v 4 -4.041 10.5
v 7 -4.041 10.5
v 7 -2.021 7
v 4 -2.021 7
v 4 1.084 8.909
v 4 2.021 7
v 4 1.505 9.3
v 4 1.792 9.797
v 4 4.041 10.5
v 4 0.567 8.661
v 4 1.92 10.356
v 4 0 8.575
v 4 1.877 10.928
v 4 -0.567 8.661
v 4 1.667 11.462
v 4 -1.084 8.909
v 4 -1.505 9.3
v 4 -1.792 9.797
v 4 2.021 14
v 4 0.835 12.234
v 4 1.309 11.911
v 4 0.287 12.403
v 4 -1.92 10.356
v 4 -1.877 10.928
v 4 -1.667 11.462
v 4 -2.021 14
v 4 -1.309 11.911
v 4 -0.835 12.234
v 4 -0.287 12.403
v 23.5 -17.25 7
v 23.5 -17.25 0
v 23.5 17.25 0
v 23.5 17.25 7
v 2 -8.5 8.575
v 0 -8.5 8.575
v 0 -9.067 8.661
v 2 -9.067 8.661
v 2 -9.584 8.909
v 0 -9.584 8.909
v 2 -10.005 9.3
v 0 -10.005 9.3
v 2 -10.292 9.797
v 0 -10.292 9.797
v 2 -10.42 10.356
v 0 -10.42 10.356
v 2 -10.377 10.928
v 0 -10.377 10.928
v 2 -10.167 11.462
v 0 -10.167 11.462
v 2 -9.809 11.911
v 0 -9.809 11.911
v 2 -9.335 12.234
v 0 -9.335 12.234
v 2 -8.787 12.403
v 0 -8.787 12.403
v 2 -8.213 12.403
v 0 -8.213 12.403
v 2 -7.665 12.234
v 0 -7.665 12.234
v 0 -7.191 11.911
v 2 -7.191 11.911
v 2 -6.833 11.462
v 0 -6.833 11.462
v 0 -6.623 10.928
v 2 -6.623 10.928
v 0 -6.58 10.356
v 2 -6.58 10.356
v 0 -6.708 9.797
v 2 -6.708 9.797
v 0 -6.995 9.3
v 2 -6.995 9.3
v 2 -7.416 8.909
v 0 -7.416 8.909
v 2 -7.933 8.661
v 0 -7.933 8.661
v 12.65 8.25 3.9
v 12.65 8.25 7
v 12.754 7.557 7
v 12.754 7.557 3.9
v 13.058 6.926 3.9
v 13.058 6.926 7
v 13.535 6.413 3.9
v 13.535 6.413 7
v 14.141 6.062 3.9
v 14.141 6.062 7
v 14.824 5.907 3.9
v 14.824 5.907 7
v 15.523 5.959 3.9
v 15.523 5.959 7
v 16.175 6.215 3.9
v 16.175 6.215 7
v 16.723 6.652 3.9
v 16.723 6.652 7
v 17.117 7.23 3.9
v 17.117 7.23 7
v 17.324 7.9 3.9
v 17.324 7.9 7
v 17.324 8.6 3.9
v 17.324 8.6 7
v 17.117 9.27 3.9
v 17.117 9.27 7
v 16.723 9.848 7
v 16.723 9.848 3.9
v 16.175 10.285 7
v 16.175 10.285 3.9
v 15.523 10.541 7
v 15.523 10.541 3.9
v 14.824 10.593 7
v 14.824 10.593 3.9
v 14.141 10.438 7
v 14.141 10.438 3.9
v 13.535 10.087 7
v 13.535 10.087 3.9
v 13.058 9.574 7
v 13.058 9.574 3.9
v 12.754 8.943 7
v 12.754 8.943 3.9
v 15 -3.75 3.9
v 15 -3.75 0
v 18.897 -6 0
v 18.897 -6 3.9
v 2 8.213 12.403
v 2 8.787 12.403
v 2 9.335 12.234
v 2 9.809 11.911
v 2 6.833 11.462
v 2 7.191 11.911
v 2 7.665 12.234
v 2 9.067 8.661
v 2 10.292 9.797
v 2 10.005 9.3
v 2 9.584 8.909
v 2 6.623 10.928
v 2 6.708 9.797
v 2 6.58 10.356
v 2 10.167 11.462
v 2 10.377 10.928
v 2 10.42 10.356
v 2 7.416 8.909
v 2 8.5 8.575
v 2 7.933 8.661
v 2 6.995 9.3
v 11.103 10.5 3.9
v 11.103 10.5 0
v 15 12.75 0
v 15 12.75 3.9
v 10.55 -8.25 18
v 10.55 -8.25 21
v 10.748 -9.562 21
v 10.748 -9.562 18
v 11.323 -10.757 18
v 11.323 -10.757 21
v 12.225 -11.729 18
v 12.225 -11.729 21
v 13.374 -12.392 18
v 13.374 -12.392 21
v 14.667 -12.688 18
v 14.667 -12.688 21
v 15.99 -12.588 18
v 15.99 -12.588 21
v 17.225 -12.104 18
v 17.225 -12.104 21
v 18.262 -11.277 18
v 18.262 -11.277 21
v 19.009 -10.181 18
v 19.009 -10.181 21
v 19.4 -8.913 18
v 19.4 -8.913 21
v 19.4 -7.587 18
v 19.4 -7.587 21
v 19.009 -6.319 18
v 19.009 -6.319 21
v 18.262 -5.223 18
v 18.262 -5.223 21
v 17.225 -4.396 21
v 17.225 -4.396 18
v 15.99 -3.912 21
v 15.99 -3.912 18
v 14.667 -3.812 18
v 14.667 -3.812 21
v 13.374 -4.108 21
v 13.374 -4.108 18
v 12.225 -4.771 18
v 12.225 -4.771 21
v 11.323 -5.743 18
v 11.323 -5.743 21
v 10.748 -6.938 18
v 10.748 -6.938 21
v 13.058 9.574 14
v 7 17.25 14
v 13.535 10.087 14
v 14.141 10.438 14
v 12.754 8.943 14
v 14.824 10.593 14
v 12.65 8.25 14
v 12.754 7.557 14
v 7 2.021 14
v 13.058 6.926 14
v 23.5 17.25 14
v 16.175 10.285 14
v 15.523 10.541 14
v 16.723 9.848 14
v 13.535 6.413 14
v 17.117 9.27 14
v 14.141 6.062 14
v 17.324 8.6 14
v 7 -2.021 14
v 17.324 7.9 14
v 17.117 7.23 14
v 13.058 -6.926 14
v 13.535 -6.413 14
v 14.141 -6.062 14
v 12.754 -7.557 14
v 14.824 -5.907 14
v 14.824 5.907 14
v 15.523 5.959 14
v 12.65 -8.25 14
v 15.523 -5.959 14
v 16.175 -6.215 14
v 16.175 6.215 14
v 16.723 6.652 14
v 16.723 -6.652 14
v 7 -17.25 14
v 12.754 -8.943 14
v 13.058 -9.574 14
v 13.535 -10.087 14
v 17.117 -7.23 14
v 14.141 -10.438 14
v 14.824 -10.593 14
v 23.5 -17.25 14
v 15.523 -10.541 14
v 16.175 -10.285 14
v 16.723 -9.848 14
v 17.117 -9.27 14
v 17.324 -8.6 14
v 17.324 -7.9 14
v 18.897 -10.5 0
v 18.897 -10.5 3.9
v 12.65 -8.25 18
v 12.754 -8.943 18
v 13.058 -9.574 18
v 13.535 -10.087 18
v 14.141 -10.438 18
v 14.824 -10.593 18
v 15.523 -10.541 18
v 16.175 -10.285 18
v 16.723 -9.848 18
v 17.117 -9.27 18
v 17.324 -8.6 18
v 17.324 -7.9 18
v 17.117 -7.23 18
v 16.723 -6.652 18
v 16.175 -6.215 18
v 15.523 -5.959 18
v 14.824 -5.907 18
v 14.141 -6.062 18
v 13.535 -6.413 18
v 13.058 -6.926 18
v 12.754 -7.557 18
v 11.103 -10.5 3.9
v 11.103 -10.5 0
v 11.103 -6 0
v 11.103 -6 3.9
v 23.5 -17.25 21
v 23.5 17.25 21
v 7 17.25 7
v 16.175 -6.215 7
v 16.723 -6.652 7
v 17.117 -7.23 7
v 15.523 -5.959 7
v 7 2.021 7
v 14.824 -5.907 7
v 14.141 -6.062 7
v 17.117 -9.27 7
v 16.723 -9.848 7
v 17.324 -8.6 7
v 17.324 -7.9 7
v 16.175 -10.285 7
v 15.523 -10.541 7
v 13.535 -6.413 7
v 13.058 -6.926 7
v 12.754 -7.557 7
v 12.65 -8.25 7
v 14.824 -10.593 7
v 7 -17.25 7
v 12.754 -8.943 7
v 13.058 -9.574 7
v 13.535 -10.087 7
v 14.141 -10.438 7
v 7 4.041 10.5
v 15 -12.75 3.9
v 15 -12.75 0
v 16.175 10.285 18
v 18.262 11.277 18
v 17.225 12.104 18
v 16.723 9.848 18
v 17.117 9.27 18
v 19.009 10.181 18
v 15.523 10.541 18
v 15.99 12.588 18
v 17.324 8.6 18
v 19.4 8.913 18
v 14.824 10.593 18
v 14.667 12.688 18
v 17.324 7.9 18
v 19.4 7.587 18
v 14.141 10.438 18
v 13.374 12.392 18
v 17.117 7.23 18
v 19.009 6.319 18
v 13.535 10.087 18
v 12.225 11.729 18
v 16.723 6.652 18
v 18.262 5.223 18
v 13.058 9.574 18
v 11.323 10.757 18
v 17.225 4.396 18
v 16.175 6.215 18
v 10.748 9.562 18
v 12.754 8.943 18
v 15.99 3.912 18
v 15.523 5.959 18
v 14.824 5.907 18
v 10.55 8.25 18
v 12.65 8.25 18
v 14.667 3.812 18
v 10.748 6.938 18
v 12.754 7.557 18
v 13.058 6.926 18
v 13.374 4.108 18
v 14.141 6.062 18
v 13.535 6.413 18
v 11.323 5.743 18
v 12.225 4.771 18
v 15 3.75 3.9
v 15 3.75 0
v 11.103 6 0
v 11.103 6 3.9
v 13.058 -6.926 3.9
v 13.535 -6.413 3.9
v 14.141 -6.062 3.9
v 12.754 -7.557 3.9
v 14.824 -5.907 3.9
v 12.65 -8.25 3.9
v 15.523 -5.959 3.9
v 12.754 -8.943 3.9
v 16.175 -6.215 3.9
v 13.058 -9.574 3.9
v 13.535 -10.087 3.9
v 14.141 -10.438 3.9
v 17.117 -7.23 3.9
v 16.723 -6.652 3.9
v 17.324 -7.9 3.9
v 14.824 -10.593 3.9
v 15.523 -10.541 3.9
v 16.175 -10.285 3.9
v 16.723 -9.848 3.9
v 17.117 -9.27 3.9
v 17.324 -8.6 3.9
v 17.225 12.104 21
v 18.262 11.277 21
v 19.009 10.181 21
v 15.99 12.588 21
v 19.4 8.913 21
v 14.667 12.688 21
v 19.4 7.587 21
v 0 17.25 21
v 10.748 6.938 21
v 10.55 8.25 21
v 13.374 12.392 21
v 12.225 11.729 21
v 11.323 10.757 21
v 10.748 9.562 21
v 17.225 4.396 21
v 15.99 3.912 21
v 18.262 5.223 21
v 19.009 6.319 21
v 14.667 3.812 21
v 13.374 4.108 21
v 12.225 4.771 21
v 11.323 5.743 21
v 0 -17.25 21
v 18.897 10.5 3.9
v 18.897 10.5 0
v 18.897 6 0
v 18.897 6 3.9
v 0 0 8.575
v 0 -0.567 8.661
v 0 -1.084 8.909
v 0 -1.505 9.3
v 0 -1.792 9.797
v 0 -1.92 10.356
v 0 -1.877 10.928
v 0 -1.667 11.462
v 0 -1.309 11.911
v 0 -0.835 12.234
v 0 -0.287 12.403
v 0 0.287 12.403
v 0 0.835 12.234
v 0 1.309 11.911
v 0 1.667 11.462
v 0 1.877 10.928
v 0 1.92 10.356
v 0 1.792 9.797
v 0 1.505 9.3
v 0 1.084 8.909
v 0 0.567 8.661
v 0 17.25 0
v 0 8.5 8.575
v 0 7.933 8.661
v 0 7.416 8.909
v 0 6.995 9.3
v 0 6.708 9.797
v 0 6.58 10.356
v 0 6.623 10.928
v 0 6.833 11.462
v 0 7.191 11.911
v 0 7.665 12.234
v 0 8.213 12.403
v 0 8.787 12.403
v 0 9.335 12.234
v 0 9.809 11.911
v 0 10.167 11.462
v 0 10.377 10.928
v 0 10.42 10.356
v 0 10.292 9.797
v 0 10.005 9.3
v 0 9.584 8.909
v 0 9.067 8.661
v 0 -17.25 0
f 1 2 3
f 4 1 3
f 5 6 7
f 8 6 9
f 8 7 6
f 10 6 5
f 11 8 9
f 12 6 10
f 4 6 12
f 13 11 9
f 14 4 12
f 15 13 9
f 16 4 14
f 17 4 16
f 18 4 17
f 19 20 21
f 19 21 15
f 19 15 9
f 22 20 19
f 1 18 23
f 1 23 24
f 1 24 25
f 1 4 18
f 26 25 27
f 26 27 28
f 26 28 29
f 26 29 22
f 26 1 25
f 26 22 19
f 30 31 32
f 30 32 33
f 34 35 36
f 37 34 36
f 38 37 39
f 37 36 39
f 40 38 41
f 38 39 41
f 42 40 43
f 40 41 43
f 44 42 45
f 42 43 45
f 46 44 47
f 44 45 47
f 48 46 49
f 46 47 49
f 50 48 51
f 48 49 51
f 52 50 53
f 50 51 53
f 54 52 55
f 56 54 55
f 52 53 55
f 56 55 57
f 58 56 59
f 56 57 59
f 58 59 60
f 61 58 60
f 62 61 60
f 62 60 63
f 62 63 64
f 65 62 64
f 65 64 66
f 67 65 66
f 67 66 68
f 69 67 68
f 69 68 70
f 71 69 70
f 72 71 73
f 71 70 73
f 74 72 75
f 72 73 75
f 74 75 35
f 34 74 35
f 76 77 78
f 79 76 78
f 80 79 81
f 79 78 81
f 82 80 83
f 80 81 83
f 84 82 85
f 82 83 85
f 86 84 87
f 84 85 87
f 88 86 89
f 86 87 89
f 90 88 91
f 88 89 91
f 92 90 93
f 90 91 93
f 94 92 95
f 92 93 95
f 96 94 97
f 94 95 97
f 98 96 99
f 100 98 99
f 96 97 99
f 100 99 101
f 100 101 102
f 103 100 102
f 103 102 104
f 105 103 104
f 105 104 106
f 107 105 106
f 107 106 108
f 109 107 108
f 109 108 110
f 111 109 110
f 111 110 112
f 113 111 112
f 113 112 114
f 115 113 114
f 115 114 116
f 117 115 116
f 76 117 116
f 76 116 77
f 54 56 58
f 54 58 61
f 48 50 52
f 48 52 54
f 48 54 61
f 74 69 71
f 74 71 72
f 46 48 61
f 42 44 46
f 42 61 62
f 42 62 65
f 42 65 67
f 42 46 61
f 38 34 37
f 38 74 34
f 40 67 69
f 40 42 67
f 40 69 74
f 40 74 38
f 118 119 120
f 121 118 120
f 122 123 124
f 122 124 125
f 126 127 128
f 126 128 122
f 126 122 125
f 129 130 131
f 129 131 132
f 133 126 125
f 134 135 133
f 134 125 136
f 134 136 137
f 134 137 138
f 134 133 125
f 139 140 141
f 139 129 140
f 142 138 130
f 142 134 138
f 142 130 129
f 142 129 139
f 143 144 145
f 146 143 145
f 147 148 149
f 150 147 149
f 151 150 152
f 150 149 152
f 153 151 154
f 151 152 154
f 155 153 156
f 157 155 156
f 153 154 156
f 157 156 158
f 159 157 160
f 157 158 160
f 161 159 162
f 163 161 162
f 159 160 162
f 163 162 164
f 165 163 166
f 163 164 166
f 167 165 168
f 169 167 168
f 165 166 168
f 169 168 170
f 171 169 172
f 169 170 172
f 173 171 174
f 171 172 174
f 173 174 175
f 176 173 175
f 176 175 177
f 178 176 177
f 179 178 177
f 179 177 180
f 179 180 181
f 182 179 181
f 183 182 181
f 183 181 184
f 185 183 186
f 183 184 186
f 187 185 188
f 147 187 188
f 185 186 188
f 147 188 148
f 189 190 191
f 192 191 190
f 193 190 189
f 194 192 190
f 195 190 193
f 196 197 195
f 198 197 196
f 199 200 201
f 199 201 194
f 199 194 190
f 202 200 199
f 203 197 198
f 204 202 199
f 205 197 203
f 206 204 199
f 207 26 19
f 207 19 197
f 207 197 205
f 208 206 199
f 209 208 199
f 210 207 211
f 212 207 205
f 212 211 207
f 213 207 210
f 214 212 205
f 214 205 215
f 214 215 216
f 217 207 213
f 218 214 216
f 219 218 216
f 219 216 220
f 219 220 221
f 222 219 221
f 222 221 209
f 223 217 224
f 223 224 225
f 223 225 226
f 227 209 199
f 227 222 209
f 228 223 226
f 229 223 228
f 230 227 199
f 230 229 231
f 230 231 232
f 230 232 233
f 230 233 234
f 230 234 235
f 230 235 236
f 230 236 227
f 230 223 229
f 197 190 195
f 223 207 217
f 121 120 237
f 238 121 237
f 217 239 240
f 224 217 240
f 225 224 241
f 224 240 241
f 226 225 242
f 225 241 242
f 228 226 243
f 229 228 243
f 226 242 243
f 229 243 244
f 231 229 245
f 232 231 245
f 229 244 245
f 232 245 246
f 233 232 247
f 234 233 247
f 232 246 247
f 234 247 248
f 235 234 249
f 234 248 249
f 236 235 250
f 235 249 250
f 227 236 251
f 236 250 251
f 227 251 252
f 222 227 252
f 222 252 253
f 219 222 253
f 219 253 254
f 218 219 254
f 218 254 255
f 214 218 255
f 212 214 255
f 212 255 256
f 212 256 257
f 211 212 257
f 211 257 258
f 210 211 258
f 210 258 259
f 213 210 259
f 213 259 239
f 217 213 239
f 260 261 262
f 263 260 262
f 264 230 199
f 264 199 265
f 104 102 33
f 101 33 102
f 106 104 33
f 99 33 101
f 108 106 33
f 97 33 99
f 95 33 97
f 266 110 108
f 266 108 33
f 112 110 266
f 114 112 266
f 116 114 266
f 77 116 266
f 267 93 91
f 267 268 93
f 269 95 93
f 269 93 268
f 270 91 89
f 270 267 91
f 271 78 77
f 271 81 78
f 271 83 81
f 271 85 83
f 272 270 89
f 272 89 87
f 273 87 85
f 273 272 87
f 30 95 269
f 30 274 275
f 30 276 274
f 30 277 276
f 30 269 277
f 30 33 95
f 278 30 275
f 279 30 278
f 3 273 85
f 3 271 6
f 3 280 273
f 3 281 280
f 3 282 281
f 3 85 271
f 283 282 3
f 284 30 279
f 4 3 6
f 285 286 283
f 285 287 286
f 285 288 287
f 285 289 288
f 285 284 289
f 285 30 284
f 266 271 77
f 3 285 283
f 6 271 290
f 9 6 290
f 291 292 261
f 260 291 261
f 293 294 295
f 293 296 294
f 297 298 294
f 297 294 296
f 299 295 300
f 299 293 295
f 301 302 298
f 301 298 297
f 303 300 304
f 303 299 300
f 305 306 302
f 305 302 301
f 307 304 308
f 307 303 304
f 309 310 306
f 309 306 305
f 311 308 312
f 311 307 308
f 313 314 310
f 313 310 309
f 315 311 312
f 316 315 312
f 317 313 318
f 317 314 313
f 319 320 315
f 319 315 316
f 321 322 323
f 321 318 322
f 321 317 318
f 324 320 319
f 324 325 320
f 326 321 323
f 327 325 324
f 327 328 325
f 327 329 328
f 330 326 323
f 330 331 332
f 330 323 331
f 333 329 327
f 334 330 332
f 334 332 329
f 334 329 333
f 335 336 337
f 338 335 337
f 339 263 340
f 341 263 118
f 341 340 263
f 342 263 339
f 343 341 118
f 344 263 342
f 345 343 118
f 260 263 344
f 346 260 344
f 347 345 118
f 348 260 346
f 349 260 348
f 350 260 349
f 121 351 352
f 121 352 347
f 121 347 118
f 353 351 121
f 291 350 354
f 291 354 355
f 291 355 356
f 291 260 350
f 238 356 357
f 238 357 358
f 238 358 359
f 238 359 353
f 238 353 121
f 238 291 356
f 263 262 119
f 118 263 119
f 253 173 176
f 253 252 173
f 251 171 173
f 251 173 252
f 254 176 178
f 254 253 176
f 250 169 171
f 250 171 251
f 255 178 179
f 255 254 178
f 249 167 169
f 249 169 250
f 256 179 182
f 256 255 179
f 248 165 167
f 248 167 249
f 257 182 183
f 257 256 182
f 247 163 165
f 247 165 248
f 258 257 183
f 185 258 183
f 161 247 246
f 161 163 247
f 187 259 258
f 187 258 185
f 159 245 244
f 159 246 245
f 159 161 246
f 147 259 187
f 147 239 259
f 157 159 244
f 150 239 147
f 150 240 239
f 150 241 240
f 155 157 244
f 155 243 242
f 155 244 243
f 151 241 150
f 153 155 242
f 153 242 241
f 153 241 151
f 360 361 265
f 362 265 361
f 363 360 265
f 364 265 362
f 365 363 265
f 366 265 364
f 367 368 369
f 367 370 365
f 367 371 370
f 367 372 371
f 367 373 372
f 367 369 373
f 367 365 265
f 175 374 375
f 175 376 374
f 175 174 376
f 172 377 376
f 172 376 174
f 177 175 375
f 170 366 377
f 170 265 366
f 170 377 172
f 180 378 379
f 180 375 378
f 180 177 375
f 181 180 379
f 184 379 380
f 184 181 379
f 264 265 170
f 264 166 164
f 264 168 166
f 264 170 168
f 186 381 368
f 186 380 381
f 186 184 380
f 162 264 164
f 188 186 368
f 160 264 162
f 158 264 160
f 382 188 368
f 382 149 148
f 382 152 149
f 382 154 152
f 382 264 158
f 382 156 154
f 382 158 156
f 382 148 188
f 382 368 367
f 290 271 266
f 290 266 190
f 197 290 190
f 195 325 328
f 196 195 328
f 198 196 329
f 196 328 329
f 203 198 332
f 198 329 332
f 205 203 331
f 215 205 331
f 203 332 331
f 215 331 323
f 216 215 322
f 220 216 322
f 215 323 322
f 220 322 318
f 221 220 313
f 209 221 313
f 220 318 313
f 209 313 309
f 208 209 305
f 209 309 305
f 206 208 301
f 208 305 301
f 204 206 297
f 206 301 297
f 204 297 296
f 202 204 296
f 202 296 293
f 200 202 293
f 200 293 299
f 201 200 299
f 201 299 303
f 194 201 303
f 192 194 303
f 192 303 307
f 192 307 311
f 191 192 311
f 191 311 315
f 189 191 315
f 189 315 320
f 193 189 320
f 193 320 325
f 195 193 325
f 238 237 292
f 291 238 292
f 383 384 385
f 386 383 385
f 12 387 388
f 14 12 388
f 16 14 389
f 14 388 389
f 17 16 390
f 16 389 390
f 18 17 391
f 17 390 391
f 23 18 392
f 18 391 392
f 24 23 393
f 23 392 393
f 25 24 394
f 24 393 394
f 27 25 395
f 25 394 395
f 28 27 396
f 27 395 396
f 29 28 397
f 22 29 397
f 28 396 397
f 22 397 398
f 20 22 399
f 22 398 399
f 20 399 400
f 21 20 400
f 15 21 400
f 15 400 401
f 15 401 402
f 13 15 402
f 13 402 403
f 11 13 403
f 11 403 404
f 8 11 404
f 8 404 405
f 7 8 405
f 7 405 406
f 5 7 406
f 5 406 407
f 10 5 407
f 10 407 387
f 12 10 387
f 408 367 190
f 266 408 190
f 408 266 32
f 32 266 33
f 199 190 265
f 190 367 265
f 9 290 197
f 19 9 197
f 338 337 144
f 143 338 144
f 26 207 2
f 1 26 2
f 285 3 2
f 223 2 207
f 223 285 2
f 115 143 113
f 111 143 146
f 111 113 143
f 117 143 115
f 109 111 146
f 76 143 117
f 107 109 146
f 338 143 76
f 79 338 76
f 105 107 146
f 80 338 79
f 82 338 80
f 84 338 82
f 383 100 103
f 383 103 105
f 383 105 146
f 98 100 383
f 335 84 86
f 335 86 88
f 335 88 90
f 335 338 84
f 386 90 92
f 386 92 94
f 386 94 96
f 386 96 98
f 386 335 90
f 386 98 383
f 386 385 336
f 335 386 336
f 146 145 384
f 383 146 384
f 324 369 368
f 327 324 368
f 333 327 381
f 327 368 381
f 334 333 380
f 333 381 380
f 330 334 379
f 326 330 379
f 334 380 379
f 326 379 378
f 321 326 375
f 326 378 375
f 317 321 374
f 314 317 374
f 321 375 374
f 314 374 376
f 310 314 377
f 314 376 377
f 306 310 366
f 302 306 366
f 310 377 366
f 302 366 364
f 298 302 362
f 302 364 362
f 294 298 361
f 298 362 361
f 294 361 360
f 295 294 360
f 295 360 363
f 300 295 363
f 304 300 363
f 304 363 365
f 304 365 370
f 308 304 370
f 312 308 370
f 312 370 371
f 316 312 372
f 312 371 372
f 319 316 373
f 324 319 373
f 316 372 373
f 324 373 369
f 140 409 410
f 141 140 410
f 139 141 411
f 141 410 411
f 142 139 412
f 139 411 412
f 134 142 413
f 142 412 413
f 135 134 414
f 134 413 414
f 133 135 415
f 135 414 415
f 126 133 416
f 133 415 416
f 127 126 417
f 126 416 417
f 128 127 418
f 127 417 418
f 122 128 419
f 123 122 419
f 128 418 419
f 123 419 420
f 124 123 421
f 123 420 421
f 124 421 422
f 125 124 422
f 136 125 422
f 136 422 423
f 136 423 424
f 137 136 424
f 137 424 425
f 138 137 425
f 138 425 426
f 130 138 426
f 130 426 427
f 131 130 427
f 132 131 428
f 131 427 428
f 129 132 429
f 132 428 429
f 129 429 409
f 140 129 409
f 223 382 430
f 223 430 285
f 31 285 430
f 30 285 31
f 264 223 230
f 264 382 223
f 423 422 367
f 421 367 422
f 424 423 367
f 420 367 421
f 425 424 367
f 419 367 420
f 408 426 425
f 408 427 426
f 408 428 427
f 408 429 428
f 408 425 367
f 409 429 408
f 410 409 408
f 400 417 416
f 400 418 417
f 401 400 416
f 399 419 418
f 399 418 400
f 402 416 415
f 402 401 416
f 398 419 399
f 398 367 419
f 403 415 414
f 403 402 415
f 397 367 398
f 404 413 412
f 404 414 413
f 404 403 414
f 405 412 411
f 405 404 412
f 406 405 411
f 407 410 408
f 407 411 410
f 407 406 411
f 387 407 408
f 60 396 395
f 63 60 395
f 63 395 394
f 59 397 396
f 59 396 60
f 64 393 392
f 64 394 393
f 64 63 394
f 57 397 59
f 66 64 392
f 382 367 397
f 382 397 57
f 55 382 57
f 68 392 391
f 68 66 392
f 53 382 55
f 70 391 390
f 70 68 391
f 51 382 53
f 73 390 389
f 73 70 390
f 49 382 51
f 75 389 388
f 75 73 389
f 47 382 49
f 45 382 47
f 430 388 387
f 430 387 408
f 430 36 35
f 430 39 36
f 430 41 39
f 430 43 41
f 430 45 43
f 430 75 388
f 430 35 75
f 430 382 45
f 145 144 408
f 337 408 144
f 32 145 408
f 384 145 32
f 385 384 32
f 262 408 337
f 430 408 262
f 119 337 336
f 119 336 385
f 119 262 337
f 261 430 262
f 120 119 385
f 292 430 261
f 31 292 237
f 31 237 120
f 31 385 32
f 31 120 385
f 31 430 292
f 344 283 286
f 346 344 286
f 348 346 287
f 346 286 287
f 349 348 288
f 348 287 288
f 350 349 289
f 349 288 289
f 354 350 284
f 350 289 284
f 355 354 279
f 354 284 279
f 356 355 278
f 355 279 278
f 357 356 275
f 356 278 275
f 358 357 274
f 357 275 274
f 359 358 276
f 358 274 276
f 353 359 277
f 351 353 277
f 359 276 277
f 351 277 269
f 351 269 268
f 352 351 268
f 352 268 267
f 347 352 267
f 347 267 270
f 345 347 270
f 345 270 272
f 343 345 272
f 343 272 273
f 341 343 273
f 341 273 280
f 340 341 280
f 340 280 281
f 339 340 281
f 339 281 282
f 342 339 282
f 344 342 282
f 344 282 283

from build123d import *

# Parameters (mm, degrees)
PAD_DEPTH       = 17.25
SKETCH001_R     = 2.35
POCKET_DEPTH    = 21.001
POCKET001_DEPTH = 3.9
SKETCH003_R     = 4.45
POCKET002_DEPTH = 3
SKETCH004_R     = 1.925
POCKET003_DEPTH = 23.501
POCKET004_DEPTH = 3
SKETCH006_R     = 1.925
POCKET005_DEPTH = 2


with BuildPart() as part:
    # Sketch → Pad (new body, symmetric)
    with BuildSketch(Plane.XZ):
        Polygon((0, 0), (23.5, 0), (23.5, 7), (7, 7), (7, 14), (23.5, 14), (23.5, 21), (0, 21), align=None)
    extrude(amount=PAD_DEPTH, both=True)

    # Sketch001 → Pocket (cut, through all)
    with BuildSketch(Plane(origin=(0, 0, 21), x_dir=(-1, 0, 0), z_dir=(0, 0, 1))):
        with Locations((-15, 8.25)):
            Circle(SKETCH001_R)
        with Locations((-15, -8.25)):
            Circle(SKETCH001_R)
    extrude(amount=-POCKET_DEPTH, mode=Mode.SUBTRACT)

    # Sketch002 → Pocket001 (cut)
    with BuildSketch(Plane(origin=(0, 0, 0), x_dir=(1, 0, 0), z_dir=(0, 0, -1))):
        Polygon((15, 12.75), (11.102886, 10.5), (11.102886, 6), (15, 3.75), (18.897114, 6), (18.897114, 10.5), align=None)
        Polygon((15, -3.75), (11.102886, -6), (11.102886, -10.5), (15, -12.75), (18.897114, -10.5), (18.897114, -6), align=None)
    extrude(amount=-POCKET001_DEPTH, mode=Mode.SUBTRACT)

    # Sketch003 → Pocket002 (cut)
    with BuildSketch(Plane(origin=(0, 0, 21), x_dir=(-1, 0, 0), z_dir=(0, 0, 1))):
        with Locations((-15, 8.25)):
            Circle(SKETCH003_R)
        with Locations((-15, -8.25)):
            Circle(SKETCH003_R)
    extrude(amount=-POCKET002_DEPTH, mode=Mode.SUBTRACT)

    # Sketch004 → Pocket003 (cut, through all)
    with BuildSketch(Plane(origin=(0, 0, 0), x_dir=(0, 0, -1), z_dir=(-1, 0, 0))):
        with Locations((-10.5, 0)):
            Circle(SKETCH004_R)
    extrude(amount=-POCKET003_DEPTH, mode=Mode.SUBTRACT)

    # Sketch005 → Pocket004 (cut)
    with BuildSketch(Plane(origin=(7, 0, 0), x_dir=(0, 0, 1), z_dir=(1, 0, 0))):
        Polygon((7, 2.020726), (7, -2.020726), (10.5, -4.041452), (14, -2.020726), (14, 2.020726), (10.5, 4.041452), align=None)
    extrude(amount=-POCKET004_DEPTH, mode=Mode.SUBTRACT)

    # Sketch006 → Pocket005 (cut)
    with BuildSketch(Plane(origin=(0, 0, 0), x_dir=(0, 0, -1), z_dir=(-1, 0, 0))):
        with Locations((-10.5, -8.5)):
            Circle(SKETCH006_R)
        with Locations((-10.5, 8.5)):
            Circle(SKETCH006_R)
    extrude(amount=-POCKET005_DEPTH, mode=Mode.SUBTRACT)


solid = part.part
